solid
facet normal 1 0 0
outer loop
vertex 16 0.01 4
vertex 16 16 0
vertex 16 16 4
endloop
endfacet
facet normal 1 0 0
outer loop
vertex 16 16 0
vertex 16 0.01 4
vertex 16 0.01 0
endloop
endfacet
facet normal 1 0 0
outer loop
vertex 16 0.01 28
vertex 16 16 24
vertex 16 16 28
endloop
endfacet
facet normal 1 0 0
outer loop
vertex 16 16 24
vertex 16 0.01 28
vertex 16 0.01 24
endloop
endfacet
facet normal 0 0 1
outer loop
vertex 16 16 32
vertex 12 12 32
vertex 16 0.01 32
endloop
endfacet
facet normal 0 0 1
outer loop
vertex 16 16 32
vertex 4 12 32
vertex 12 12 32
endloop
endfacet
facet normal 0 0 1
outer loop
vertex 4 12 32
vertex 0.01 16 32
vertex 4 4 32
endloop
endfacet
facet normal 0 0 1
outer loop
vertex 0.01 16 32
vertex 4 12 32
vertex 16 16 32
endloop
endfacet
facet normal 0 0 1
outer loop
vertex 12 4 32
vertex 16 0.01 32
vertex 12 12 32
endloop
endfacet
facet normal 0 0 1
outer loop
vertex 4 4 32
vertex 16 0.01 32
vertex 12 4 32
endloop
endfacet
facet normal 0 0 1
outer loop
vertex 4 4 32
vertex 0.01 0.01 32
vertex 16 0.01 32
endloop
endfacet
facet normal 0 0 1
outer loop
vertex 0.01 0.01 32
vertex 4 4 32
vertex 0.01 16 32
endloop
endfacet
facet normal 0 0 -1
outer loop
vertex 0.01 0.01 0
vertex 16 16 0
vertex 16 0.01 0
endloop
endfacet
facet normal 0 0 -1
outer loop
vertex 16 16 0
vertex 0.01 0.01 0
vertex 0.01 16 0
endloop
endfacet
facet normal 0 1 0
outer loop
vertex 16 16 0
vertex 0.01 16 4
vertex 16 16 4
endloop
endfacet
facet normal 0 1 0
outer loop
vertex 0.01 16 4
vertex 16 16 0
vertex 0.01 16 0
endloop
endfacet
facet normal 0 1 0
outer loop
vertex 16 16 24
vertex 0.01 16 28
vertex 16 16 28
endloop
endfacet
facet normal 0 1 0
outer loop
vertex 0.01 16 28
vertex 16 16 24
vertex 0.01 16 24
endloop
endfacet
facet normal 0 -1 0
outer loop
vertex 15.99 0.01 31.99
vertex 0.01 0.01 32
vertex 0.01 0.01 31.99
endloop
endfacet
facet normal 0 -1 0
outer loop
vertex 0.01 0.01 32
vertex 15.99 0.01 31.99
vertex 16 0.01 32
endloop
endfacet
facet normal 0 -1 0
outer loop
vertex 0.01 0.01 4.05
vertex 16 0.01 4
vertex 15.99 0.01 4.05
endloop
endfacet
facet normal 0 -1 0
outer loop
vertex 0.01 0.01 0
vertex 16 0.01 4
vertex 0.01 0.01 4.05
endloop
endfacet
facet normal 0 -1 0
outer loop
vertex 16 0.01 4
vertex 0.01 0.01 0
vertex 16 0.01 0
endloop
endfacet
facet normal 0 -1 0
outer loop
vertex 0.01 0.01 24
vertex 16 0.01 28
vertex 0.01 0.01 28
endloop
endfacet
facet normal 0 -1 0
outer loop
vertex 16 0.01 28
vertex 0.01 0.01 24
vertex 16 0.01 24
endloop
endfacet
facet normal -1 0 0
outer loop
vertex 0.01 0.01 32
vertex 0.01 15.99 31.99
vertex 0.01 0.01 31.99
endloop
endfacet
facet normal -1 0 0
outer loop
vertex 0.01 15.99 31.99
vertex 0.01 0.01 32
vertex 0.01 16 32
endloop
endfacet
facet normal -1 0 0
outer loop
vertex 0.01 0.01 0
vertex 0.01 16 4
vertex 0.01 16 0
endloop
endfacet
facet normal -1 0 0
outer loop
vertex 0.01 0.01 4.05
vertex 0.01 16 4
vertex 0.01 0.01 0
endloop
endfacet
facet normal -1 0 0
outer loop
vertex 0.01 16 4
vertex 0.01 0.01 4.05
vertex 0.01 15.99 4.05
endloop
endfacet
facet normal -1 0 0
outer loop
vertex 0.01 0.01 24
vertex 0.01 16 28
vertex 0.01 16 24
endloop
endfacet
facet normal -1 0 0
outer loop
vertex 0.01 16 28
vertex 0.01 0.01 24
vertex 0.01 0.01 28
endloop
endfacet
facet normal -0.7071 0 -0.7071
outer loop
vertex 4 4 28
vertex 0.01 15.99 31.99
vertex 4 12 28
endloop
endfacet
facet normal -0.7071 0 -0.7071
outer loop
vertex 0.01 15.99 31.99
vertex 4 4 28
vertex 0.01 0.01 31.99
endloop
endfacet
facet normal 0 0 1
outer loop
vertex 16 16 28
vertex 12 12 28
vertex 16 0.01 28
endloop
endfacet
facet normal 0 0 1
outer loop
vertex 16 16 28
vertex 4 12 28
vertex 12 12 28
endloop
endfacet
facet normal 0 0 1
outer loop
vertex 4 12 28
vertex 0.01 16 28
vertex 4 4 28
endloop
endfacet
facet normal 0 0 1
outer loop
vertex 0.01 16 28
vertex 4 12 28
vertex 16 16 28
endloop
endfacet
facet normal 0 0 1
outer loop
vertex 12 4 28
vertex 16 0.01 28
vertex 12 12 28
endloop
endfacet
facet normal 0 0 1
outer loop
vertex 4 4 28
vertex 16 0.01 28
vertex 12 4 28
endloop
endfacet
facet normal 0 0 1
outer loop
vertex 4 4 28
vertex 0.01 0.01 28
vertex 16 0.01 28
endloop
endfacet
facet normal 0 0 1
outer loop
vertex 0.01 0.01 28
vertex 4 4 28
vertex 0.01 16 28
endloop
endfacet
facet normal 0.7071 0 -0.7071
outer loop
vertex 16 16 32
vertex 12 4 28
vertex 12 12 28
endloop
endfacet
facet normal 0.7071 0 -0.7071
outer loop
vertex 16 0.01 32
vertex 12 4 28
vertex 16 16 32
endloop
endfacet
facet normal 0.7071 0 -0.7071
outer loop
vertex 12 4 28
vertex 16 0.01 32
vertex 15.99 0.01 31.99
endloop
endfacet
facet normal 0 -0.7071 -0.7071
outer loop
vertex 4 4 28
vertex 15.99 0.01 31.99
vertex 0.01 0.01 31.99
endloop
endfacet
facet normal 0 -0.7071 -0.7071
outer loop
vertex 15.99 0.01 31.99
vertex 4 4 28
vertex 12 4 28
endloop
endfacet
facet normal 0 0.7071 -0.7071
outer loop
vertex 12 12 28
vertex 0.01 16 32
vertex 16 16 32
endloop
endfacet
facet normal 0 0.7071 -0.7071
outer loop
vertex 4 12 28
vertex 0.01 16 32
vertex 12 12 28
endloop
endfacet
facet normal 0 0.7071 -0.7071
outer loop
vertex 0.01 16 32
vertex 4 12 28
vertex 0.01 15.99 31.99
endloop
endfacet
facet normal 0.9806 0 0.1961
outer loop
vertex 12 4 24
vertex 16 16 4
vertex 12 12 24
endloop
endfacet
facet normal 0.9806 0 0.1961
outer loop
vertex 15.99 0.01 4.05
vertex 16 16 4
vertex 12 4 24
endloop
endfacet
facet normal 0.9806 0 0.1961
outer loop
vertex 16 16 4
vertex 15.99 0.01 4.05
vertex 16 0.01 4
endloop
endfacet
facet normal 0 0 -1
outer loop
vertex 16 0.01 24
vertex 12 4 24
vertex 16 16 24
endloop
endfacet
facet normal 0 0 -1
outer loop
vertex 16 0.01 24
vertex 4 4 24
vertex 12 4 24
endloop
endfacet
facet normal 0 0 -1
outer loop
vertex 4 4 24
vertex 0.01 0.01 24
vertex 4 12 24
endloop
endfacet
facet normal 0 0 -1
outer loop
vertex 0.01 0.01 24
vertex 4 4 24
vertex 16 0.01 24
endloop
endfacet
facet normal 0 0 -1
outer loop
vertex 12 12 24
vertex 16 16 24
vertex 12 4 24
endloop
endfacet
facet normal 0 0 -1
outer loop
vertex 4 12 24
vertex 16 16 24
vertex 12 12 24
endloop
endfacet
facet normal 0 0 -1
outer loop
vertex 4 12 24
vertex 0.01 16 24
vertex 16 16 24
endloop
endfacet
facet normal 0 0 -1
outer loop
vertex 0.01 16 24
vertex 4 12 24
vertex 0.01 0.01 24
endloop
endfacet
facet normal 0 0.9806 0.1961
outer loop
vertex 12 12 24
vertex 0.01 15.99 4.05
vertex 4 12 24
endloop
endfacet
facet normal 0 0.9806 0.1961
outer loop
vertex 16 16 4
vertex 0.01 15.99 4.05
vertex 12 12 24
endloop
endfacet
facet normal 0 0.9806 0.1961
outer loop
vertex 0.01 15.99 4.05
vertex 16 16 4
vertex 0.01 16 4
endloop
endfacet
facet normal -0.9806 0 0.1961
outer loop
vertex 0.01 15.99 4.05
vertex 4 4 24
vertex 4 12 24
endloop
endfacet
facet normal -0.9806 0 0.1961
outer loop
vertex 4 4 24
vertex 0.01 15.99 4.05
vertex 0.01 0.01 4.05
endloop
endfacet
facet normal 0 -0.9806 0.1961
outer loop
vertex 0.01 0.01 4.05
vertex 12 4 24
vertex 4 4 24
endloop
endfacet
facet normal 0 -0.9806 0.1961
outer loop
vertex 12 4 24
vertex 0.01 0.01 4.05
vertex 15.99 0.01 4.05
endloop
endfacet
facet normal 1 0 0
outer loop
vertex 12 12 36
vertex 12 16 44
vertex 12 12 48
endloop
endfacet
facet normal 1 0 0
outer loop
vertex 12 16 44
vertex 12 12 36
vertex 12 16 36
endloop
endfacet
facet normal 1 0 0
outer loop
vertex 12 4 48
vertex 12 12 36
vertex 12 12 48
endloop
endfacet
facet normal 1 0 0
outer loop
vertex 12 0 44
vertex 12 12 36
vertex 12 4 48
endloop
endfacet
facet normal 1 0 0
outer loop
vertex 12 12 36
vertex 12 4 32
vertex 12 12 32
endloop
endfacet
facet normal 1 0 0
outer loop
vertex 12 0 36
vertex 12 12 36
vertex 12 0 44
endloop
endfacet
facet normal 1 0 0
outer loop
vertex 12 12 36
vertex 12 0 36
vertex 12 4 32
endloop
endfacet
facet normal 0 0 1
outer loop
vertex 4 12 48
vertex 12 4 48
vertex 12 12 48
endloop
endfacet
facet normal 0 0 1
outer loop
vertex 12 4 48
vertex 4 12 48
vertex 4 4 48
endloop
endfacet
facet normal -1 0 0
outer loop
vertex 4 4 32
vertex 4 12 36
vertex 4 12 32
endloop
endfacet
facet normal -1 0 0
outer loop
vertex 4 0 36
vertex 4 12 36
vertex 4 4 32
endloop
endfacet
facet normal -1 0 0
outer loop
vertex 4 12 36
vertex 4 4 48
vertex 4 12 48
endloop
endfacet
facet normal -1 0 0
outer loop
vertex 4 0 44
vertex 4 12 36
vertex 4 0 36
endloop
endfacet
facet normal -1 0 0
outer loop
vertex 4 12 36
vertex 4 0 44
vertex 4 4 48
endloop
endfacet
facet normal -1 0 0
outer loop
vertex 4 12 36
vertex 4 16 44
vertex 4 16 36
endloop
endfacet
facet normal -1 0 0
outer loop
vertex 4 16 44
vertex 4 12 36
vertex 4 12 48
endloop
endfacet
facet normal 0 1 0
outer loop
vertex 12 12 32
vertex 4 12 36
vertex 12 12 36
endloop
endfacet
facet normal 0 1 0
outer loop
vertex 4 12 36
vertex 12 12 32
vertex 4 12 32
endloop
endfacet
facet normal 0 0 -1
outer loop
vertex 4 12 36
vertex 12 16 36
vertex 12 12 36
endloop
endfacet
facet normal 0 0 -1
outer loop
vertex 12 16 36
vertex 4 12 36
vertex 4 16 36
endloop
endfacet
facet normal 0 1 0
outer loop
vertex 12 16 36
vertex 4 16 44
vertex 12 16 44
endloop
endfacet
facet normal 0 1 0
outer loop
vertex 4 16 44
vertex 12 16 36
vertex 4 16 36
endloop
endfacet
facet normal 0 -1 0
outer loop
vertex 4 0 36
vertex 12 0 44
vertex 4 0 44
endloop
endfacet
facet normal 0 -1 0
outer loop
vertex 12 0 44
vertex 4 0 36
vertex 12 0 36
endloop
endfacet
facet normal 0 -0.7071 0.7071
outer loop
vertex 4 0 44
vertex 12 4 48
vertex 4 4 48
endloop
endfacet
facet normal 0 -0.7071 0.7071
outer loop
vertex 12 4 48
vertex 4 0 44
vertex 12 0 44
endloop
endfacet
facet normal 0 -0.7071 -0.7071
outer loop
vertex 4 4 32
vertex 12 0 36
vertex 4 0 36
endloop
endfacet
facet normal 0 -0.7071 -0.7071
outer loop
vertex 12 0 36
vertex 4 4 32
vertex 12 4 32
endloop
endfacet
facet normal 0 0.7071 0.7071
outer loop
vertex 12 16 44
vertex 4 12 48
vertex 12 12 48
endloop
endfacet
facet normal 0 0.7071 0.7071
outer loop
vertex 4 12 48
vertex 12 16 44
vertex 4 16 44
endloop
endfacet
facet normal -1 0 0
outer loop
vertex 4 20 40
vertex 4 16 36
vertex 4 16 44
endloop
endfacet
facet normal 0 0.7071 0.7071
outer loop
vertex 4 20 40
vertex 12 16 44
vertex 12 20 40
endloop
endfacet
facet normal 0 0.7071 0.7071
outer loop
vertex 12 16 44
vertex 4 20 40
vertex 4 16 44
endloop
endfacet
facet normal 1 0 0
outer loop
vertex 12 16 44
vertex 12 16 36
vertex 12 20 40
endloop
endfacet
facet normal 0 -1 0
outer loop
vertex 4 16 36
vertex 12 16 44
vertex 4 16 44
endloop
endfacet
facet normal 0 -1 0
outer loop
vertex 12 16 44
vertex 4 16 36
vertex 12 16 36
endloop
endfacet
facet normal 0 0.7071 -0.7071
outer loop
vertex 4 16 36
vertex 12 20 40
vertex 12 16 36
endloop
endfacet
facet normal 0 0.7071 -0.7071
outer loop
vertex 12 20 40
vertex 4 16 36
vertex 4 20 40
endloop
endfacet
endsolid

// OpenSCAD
translate([4,4,32])
cube([8,8,16]);
translate([4,0,36])
cube([8,16,8]);




translate([4,4,44])
	rotate([90,270,90])
	linear_extrude(height =8, center = false, convexity = 10, twist = 0)
	polygon([[0,0],[4,0],[0,4]],[[0,1,2]]);

translate([4,4,36])
	rotate([90,180,90])
	linear_extrude(height =8, center = false, convexity = 10, twist = 0)
	polygon([[0,0],[4,0],[0,4]],[[0,1,2]]);

translate([4,12,44  ])
	rotate([90,0,90])
	linear_extrude(height =8, center = false, convexity = 10, twist = 0)
	polygon([[0,0],[4,0],[0,4]],[[0,1,2]]);

translate([4,20,40  ])
	rotate([90,225,90])
	linear_extrude(height =8, center = false, convexity = 10, twist = 0)
	polygon([[0,0],[sqrt(32),0],[0,sqrt(32)]],[[0,1,2]]);

difference () {
cube([16,16,32]);

//clean up
translate([0,0,0])
	cube([16,.01, 32]);
translate([0,16,0])
	cube([16,.01, 32]);
translate([0,0,0])
	cube([.01,16, 32]);
translate([16,0,0])
	cube([.01,16, 32]);

//Creation of the top cut
translate([0,16,28])
	rotate([90,0,0])
	linear_extrude(height =16, center = false, convexity = 10, twist = 0)
	polygon([[0,0],[4,0],[0,4]],[[0,1,2]]);
translate([16,0,28])
	rotate([90,0,180])
	linear_extrude(height =16, center = false, convexity = 10, twist = 0)
	polygon([[0,0],[4,0],[0,4]],[[0,1,2]]);
translate([0,0,28])
	rotate([90,0,90])
	linear_extrude(height =16, center = false, convexity = 10, twist = 0)
	polygon([[0,0],[4,0],[0,4]],[[0,1,2]]);
translate([16,16,28])
	rotate([90,0,270])
	linear_extrude(height =16, center = false, convexity = 10, twist = 0)
	polygon([[0,0],[4,0],[0,4]],[[0,1,2]]);


//Creation of the bottom Cut
translate([16,16,24])
	rotate([90,180,0])
	linear_extrude(height =16, center = false, convexity = 10, twist = 0)
	polygon([[0,20],[0,0],[4,0]],[[0,1,2]]);
translate([0,16,24])
	rotate([90,180,90])
	linear_extrude(height =16, center = false, convexity = 10, twist = 0)
	polygon([[0,20],[0,0],[4,0]],[[0,1,2]]);
translate([0,0,24])
	rotate([90,180,180])
	linear_extrude(height =16, center = false, convexity = 10, twist = 0)
	polygon([[0,20],[0,0],[4,0]],[[0,1,2]]);
translate([16,0,24])
	rotate([90,180,270])
	linear_extrude(height =16, center = false, convexity = 10, twist = 0)
	polygon([[0,20],[0,0],[4,0]],[[0,1,2]]);	
}
